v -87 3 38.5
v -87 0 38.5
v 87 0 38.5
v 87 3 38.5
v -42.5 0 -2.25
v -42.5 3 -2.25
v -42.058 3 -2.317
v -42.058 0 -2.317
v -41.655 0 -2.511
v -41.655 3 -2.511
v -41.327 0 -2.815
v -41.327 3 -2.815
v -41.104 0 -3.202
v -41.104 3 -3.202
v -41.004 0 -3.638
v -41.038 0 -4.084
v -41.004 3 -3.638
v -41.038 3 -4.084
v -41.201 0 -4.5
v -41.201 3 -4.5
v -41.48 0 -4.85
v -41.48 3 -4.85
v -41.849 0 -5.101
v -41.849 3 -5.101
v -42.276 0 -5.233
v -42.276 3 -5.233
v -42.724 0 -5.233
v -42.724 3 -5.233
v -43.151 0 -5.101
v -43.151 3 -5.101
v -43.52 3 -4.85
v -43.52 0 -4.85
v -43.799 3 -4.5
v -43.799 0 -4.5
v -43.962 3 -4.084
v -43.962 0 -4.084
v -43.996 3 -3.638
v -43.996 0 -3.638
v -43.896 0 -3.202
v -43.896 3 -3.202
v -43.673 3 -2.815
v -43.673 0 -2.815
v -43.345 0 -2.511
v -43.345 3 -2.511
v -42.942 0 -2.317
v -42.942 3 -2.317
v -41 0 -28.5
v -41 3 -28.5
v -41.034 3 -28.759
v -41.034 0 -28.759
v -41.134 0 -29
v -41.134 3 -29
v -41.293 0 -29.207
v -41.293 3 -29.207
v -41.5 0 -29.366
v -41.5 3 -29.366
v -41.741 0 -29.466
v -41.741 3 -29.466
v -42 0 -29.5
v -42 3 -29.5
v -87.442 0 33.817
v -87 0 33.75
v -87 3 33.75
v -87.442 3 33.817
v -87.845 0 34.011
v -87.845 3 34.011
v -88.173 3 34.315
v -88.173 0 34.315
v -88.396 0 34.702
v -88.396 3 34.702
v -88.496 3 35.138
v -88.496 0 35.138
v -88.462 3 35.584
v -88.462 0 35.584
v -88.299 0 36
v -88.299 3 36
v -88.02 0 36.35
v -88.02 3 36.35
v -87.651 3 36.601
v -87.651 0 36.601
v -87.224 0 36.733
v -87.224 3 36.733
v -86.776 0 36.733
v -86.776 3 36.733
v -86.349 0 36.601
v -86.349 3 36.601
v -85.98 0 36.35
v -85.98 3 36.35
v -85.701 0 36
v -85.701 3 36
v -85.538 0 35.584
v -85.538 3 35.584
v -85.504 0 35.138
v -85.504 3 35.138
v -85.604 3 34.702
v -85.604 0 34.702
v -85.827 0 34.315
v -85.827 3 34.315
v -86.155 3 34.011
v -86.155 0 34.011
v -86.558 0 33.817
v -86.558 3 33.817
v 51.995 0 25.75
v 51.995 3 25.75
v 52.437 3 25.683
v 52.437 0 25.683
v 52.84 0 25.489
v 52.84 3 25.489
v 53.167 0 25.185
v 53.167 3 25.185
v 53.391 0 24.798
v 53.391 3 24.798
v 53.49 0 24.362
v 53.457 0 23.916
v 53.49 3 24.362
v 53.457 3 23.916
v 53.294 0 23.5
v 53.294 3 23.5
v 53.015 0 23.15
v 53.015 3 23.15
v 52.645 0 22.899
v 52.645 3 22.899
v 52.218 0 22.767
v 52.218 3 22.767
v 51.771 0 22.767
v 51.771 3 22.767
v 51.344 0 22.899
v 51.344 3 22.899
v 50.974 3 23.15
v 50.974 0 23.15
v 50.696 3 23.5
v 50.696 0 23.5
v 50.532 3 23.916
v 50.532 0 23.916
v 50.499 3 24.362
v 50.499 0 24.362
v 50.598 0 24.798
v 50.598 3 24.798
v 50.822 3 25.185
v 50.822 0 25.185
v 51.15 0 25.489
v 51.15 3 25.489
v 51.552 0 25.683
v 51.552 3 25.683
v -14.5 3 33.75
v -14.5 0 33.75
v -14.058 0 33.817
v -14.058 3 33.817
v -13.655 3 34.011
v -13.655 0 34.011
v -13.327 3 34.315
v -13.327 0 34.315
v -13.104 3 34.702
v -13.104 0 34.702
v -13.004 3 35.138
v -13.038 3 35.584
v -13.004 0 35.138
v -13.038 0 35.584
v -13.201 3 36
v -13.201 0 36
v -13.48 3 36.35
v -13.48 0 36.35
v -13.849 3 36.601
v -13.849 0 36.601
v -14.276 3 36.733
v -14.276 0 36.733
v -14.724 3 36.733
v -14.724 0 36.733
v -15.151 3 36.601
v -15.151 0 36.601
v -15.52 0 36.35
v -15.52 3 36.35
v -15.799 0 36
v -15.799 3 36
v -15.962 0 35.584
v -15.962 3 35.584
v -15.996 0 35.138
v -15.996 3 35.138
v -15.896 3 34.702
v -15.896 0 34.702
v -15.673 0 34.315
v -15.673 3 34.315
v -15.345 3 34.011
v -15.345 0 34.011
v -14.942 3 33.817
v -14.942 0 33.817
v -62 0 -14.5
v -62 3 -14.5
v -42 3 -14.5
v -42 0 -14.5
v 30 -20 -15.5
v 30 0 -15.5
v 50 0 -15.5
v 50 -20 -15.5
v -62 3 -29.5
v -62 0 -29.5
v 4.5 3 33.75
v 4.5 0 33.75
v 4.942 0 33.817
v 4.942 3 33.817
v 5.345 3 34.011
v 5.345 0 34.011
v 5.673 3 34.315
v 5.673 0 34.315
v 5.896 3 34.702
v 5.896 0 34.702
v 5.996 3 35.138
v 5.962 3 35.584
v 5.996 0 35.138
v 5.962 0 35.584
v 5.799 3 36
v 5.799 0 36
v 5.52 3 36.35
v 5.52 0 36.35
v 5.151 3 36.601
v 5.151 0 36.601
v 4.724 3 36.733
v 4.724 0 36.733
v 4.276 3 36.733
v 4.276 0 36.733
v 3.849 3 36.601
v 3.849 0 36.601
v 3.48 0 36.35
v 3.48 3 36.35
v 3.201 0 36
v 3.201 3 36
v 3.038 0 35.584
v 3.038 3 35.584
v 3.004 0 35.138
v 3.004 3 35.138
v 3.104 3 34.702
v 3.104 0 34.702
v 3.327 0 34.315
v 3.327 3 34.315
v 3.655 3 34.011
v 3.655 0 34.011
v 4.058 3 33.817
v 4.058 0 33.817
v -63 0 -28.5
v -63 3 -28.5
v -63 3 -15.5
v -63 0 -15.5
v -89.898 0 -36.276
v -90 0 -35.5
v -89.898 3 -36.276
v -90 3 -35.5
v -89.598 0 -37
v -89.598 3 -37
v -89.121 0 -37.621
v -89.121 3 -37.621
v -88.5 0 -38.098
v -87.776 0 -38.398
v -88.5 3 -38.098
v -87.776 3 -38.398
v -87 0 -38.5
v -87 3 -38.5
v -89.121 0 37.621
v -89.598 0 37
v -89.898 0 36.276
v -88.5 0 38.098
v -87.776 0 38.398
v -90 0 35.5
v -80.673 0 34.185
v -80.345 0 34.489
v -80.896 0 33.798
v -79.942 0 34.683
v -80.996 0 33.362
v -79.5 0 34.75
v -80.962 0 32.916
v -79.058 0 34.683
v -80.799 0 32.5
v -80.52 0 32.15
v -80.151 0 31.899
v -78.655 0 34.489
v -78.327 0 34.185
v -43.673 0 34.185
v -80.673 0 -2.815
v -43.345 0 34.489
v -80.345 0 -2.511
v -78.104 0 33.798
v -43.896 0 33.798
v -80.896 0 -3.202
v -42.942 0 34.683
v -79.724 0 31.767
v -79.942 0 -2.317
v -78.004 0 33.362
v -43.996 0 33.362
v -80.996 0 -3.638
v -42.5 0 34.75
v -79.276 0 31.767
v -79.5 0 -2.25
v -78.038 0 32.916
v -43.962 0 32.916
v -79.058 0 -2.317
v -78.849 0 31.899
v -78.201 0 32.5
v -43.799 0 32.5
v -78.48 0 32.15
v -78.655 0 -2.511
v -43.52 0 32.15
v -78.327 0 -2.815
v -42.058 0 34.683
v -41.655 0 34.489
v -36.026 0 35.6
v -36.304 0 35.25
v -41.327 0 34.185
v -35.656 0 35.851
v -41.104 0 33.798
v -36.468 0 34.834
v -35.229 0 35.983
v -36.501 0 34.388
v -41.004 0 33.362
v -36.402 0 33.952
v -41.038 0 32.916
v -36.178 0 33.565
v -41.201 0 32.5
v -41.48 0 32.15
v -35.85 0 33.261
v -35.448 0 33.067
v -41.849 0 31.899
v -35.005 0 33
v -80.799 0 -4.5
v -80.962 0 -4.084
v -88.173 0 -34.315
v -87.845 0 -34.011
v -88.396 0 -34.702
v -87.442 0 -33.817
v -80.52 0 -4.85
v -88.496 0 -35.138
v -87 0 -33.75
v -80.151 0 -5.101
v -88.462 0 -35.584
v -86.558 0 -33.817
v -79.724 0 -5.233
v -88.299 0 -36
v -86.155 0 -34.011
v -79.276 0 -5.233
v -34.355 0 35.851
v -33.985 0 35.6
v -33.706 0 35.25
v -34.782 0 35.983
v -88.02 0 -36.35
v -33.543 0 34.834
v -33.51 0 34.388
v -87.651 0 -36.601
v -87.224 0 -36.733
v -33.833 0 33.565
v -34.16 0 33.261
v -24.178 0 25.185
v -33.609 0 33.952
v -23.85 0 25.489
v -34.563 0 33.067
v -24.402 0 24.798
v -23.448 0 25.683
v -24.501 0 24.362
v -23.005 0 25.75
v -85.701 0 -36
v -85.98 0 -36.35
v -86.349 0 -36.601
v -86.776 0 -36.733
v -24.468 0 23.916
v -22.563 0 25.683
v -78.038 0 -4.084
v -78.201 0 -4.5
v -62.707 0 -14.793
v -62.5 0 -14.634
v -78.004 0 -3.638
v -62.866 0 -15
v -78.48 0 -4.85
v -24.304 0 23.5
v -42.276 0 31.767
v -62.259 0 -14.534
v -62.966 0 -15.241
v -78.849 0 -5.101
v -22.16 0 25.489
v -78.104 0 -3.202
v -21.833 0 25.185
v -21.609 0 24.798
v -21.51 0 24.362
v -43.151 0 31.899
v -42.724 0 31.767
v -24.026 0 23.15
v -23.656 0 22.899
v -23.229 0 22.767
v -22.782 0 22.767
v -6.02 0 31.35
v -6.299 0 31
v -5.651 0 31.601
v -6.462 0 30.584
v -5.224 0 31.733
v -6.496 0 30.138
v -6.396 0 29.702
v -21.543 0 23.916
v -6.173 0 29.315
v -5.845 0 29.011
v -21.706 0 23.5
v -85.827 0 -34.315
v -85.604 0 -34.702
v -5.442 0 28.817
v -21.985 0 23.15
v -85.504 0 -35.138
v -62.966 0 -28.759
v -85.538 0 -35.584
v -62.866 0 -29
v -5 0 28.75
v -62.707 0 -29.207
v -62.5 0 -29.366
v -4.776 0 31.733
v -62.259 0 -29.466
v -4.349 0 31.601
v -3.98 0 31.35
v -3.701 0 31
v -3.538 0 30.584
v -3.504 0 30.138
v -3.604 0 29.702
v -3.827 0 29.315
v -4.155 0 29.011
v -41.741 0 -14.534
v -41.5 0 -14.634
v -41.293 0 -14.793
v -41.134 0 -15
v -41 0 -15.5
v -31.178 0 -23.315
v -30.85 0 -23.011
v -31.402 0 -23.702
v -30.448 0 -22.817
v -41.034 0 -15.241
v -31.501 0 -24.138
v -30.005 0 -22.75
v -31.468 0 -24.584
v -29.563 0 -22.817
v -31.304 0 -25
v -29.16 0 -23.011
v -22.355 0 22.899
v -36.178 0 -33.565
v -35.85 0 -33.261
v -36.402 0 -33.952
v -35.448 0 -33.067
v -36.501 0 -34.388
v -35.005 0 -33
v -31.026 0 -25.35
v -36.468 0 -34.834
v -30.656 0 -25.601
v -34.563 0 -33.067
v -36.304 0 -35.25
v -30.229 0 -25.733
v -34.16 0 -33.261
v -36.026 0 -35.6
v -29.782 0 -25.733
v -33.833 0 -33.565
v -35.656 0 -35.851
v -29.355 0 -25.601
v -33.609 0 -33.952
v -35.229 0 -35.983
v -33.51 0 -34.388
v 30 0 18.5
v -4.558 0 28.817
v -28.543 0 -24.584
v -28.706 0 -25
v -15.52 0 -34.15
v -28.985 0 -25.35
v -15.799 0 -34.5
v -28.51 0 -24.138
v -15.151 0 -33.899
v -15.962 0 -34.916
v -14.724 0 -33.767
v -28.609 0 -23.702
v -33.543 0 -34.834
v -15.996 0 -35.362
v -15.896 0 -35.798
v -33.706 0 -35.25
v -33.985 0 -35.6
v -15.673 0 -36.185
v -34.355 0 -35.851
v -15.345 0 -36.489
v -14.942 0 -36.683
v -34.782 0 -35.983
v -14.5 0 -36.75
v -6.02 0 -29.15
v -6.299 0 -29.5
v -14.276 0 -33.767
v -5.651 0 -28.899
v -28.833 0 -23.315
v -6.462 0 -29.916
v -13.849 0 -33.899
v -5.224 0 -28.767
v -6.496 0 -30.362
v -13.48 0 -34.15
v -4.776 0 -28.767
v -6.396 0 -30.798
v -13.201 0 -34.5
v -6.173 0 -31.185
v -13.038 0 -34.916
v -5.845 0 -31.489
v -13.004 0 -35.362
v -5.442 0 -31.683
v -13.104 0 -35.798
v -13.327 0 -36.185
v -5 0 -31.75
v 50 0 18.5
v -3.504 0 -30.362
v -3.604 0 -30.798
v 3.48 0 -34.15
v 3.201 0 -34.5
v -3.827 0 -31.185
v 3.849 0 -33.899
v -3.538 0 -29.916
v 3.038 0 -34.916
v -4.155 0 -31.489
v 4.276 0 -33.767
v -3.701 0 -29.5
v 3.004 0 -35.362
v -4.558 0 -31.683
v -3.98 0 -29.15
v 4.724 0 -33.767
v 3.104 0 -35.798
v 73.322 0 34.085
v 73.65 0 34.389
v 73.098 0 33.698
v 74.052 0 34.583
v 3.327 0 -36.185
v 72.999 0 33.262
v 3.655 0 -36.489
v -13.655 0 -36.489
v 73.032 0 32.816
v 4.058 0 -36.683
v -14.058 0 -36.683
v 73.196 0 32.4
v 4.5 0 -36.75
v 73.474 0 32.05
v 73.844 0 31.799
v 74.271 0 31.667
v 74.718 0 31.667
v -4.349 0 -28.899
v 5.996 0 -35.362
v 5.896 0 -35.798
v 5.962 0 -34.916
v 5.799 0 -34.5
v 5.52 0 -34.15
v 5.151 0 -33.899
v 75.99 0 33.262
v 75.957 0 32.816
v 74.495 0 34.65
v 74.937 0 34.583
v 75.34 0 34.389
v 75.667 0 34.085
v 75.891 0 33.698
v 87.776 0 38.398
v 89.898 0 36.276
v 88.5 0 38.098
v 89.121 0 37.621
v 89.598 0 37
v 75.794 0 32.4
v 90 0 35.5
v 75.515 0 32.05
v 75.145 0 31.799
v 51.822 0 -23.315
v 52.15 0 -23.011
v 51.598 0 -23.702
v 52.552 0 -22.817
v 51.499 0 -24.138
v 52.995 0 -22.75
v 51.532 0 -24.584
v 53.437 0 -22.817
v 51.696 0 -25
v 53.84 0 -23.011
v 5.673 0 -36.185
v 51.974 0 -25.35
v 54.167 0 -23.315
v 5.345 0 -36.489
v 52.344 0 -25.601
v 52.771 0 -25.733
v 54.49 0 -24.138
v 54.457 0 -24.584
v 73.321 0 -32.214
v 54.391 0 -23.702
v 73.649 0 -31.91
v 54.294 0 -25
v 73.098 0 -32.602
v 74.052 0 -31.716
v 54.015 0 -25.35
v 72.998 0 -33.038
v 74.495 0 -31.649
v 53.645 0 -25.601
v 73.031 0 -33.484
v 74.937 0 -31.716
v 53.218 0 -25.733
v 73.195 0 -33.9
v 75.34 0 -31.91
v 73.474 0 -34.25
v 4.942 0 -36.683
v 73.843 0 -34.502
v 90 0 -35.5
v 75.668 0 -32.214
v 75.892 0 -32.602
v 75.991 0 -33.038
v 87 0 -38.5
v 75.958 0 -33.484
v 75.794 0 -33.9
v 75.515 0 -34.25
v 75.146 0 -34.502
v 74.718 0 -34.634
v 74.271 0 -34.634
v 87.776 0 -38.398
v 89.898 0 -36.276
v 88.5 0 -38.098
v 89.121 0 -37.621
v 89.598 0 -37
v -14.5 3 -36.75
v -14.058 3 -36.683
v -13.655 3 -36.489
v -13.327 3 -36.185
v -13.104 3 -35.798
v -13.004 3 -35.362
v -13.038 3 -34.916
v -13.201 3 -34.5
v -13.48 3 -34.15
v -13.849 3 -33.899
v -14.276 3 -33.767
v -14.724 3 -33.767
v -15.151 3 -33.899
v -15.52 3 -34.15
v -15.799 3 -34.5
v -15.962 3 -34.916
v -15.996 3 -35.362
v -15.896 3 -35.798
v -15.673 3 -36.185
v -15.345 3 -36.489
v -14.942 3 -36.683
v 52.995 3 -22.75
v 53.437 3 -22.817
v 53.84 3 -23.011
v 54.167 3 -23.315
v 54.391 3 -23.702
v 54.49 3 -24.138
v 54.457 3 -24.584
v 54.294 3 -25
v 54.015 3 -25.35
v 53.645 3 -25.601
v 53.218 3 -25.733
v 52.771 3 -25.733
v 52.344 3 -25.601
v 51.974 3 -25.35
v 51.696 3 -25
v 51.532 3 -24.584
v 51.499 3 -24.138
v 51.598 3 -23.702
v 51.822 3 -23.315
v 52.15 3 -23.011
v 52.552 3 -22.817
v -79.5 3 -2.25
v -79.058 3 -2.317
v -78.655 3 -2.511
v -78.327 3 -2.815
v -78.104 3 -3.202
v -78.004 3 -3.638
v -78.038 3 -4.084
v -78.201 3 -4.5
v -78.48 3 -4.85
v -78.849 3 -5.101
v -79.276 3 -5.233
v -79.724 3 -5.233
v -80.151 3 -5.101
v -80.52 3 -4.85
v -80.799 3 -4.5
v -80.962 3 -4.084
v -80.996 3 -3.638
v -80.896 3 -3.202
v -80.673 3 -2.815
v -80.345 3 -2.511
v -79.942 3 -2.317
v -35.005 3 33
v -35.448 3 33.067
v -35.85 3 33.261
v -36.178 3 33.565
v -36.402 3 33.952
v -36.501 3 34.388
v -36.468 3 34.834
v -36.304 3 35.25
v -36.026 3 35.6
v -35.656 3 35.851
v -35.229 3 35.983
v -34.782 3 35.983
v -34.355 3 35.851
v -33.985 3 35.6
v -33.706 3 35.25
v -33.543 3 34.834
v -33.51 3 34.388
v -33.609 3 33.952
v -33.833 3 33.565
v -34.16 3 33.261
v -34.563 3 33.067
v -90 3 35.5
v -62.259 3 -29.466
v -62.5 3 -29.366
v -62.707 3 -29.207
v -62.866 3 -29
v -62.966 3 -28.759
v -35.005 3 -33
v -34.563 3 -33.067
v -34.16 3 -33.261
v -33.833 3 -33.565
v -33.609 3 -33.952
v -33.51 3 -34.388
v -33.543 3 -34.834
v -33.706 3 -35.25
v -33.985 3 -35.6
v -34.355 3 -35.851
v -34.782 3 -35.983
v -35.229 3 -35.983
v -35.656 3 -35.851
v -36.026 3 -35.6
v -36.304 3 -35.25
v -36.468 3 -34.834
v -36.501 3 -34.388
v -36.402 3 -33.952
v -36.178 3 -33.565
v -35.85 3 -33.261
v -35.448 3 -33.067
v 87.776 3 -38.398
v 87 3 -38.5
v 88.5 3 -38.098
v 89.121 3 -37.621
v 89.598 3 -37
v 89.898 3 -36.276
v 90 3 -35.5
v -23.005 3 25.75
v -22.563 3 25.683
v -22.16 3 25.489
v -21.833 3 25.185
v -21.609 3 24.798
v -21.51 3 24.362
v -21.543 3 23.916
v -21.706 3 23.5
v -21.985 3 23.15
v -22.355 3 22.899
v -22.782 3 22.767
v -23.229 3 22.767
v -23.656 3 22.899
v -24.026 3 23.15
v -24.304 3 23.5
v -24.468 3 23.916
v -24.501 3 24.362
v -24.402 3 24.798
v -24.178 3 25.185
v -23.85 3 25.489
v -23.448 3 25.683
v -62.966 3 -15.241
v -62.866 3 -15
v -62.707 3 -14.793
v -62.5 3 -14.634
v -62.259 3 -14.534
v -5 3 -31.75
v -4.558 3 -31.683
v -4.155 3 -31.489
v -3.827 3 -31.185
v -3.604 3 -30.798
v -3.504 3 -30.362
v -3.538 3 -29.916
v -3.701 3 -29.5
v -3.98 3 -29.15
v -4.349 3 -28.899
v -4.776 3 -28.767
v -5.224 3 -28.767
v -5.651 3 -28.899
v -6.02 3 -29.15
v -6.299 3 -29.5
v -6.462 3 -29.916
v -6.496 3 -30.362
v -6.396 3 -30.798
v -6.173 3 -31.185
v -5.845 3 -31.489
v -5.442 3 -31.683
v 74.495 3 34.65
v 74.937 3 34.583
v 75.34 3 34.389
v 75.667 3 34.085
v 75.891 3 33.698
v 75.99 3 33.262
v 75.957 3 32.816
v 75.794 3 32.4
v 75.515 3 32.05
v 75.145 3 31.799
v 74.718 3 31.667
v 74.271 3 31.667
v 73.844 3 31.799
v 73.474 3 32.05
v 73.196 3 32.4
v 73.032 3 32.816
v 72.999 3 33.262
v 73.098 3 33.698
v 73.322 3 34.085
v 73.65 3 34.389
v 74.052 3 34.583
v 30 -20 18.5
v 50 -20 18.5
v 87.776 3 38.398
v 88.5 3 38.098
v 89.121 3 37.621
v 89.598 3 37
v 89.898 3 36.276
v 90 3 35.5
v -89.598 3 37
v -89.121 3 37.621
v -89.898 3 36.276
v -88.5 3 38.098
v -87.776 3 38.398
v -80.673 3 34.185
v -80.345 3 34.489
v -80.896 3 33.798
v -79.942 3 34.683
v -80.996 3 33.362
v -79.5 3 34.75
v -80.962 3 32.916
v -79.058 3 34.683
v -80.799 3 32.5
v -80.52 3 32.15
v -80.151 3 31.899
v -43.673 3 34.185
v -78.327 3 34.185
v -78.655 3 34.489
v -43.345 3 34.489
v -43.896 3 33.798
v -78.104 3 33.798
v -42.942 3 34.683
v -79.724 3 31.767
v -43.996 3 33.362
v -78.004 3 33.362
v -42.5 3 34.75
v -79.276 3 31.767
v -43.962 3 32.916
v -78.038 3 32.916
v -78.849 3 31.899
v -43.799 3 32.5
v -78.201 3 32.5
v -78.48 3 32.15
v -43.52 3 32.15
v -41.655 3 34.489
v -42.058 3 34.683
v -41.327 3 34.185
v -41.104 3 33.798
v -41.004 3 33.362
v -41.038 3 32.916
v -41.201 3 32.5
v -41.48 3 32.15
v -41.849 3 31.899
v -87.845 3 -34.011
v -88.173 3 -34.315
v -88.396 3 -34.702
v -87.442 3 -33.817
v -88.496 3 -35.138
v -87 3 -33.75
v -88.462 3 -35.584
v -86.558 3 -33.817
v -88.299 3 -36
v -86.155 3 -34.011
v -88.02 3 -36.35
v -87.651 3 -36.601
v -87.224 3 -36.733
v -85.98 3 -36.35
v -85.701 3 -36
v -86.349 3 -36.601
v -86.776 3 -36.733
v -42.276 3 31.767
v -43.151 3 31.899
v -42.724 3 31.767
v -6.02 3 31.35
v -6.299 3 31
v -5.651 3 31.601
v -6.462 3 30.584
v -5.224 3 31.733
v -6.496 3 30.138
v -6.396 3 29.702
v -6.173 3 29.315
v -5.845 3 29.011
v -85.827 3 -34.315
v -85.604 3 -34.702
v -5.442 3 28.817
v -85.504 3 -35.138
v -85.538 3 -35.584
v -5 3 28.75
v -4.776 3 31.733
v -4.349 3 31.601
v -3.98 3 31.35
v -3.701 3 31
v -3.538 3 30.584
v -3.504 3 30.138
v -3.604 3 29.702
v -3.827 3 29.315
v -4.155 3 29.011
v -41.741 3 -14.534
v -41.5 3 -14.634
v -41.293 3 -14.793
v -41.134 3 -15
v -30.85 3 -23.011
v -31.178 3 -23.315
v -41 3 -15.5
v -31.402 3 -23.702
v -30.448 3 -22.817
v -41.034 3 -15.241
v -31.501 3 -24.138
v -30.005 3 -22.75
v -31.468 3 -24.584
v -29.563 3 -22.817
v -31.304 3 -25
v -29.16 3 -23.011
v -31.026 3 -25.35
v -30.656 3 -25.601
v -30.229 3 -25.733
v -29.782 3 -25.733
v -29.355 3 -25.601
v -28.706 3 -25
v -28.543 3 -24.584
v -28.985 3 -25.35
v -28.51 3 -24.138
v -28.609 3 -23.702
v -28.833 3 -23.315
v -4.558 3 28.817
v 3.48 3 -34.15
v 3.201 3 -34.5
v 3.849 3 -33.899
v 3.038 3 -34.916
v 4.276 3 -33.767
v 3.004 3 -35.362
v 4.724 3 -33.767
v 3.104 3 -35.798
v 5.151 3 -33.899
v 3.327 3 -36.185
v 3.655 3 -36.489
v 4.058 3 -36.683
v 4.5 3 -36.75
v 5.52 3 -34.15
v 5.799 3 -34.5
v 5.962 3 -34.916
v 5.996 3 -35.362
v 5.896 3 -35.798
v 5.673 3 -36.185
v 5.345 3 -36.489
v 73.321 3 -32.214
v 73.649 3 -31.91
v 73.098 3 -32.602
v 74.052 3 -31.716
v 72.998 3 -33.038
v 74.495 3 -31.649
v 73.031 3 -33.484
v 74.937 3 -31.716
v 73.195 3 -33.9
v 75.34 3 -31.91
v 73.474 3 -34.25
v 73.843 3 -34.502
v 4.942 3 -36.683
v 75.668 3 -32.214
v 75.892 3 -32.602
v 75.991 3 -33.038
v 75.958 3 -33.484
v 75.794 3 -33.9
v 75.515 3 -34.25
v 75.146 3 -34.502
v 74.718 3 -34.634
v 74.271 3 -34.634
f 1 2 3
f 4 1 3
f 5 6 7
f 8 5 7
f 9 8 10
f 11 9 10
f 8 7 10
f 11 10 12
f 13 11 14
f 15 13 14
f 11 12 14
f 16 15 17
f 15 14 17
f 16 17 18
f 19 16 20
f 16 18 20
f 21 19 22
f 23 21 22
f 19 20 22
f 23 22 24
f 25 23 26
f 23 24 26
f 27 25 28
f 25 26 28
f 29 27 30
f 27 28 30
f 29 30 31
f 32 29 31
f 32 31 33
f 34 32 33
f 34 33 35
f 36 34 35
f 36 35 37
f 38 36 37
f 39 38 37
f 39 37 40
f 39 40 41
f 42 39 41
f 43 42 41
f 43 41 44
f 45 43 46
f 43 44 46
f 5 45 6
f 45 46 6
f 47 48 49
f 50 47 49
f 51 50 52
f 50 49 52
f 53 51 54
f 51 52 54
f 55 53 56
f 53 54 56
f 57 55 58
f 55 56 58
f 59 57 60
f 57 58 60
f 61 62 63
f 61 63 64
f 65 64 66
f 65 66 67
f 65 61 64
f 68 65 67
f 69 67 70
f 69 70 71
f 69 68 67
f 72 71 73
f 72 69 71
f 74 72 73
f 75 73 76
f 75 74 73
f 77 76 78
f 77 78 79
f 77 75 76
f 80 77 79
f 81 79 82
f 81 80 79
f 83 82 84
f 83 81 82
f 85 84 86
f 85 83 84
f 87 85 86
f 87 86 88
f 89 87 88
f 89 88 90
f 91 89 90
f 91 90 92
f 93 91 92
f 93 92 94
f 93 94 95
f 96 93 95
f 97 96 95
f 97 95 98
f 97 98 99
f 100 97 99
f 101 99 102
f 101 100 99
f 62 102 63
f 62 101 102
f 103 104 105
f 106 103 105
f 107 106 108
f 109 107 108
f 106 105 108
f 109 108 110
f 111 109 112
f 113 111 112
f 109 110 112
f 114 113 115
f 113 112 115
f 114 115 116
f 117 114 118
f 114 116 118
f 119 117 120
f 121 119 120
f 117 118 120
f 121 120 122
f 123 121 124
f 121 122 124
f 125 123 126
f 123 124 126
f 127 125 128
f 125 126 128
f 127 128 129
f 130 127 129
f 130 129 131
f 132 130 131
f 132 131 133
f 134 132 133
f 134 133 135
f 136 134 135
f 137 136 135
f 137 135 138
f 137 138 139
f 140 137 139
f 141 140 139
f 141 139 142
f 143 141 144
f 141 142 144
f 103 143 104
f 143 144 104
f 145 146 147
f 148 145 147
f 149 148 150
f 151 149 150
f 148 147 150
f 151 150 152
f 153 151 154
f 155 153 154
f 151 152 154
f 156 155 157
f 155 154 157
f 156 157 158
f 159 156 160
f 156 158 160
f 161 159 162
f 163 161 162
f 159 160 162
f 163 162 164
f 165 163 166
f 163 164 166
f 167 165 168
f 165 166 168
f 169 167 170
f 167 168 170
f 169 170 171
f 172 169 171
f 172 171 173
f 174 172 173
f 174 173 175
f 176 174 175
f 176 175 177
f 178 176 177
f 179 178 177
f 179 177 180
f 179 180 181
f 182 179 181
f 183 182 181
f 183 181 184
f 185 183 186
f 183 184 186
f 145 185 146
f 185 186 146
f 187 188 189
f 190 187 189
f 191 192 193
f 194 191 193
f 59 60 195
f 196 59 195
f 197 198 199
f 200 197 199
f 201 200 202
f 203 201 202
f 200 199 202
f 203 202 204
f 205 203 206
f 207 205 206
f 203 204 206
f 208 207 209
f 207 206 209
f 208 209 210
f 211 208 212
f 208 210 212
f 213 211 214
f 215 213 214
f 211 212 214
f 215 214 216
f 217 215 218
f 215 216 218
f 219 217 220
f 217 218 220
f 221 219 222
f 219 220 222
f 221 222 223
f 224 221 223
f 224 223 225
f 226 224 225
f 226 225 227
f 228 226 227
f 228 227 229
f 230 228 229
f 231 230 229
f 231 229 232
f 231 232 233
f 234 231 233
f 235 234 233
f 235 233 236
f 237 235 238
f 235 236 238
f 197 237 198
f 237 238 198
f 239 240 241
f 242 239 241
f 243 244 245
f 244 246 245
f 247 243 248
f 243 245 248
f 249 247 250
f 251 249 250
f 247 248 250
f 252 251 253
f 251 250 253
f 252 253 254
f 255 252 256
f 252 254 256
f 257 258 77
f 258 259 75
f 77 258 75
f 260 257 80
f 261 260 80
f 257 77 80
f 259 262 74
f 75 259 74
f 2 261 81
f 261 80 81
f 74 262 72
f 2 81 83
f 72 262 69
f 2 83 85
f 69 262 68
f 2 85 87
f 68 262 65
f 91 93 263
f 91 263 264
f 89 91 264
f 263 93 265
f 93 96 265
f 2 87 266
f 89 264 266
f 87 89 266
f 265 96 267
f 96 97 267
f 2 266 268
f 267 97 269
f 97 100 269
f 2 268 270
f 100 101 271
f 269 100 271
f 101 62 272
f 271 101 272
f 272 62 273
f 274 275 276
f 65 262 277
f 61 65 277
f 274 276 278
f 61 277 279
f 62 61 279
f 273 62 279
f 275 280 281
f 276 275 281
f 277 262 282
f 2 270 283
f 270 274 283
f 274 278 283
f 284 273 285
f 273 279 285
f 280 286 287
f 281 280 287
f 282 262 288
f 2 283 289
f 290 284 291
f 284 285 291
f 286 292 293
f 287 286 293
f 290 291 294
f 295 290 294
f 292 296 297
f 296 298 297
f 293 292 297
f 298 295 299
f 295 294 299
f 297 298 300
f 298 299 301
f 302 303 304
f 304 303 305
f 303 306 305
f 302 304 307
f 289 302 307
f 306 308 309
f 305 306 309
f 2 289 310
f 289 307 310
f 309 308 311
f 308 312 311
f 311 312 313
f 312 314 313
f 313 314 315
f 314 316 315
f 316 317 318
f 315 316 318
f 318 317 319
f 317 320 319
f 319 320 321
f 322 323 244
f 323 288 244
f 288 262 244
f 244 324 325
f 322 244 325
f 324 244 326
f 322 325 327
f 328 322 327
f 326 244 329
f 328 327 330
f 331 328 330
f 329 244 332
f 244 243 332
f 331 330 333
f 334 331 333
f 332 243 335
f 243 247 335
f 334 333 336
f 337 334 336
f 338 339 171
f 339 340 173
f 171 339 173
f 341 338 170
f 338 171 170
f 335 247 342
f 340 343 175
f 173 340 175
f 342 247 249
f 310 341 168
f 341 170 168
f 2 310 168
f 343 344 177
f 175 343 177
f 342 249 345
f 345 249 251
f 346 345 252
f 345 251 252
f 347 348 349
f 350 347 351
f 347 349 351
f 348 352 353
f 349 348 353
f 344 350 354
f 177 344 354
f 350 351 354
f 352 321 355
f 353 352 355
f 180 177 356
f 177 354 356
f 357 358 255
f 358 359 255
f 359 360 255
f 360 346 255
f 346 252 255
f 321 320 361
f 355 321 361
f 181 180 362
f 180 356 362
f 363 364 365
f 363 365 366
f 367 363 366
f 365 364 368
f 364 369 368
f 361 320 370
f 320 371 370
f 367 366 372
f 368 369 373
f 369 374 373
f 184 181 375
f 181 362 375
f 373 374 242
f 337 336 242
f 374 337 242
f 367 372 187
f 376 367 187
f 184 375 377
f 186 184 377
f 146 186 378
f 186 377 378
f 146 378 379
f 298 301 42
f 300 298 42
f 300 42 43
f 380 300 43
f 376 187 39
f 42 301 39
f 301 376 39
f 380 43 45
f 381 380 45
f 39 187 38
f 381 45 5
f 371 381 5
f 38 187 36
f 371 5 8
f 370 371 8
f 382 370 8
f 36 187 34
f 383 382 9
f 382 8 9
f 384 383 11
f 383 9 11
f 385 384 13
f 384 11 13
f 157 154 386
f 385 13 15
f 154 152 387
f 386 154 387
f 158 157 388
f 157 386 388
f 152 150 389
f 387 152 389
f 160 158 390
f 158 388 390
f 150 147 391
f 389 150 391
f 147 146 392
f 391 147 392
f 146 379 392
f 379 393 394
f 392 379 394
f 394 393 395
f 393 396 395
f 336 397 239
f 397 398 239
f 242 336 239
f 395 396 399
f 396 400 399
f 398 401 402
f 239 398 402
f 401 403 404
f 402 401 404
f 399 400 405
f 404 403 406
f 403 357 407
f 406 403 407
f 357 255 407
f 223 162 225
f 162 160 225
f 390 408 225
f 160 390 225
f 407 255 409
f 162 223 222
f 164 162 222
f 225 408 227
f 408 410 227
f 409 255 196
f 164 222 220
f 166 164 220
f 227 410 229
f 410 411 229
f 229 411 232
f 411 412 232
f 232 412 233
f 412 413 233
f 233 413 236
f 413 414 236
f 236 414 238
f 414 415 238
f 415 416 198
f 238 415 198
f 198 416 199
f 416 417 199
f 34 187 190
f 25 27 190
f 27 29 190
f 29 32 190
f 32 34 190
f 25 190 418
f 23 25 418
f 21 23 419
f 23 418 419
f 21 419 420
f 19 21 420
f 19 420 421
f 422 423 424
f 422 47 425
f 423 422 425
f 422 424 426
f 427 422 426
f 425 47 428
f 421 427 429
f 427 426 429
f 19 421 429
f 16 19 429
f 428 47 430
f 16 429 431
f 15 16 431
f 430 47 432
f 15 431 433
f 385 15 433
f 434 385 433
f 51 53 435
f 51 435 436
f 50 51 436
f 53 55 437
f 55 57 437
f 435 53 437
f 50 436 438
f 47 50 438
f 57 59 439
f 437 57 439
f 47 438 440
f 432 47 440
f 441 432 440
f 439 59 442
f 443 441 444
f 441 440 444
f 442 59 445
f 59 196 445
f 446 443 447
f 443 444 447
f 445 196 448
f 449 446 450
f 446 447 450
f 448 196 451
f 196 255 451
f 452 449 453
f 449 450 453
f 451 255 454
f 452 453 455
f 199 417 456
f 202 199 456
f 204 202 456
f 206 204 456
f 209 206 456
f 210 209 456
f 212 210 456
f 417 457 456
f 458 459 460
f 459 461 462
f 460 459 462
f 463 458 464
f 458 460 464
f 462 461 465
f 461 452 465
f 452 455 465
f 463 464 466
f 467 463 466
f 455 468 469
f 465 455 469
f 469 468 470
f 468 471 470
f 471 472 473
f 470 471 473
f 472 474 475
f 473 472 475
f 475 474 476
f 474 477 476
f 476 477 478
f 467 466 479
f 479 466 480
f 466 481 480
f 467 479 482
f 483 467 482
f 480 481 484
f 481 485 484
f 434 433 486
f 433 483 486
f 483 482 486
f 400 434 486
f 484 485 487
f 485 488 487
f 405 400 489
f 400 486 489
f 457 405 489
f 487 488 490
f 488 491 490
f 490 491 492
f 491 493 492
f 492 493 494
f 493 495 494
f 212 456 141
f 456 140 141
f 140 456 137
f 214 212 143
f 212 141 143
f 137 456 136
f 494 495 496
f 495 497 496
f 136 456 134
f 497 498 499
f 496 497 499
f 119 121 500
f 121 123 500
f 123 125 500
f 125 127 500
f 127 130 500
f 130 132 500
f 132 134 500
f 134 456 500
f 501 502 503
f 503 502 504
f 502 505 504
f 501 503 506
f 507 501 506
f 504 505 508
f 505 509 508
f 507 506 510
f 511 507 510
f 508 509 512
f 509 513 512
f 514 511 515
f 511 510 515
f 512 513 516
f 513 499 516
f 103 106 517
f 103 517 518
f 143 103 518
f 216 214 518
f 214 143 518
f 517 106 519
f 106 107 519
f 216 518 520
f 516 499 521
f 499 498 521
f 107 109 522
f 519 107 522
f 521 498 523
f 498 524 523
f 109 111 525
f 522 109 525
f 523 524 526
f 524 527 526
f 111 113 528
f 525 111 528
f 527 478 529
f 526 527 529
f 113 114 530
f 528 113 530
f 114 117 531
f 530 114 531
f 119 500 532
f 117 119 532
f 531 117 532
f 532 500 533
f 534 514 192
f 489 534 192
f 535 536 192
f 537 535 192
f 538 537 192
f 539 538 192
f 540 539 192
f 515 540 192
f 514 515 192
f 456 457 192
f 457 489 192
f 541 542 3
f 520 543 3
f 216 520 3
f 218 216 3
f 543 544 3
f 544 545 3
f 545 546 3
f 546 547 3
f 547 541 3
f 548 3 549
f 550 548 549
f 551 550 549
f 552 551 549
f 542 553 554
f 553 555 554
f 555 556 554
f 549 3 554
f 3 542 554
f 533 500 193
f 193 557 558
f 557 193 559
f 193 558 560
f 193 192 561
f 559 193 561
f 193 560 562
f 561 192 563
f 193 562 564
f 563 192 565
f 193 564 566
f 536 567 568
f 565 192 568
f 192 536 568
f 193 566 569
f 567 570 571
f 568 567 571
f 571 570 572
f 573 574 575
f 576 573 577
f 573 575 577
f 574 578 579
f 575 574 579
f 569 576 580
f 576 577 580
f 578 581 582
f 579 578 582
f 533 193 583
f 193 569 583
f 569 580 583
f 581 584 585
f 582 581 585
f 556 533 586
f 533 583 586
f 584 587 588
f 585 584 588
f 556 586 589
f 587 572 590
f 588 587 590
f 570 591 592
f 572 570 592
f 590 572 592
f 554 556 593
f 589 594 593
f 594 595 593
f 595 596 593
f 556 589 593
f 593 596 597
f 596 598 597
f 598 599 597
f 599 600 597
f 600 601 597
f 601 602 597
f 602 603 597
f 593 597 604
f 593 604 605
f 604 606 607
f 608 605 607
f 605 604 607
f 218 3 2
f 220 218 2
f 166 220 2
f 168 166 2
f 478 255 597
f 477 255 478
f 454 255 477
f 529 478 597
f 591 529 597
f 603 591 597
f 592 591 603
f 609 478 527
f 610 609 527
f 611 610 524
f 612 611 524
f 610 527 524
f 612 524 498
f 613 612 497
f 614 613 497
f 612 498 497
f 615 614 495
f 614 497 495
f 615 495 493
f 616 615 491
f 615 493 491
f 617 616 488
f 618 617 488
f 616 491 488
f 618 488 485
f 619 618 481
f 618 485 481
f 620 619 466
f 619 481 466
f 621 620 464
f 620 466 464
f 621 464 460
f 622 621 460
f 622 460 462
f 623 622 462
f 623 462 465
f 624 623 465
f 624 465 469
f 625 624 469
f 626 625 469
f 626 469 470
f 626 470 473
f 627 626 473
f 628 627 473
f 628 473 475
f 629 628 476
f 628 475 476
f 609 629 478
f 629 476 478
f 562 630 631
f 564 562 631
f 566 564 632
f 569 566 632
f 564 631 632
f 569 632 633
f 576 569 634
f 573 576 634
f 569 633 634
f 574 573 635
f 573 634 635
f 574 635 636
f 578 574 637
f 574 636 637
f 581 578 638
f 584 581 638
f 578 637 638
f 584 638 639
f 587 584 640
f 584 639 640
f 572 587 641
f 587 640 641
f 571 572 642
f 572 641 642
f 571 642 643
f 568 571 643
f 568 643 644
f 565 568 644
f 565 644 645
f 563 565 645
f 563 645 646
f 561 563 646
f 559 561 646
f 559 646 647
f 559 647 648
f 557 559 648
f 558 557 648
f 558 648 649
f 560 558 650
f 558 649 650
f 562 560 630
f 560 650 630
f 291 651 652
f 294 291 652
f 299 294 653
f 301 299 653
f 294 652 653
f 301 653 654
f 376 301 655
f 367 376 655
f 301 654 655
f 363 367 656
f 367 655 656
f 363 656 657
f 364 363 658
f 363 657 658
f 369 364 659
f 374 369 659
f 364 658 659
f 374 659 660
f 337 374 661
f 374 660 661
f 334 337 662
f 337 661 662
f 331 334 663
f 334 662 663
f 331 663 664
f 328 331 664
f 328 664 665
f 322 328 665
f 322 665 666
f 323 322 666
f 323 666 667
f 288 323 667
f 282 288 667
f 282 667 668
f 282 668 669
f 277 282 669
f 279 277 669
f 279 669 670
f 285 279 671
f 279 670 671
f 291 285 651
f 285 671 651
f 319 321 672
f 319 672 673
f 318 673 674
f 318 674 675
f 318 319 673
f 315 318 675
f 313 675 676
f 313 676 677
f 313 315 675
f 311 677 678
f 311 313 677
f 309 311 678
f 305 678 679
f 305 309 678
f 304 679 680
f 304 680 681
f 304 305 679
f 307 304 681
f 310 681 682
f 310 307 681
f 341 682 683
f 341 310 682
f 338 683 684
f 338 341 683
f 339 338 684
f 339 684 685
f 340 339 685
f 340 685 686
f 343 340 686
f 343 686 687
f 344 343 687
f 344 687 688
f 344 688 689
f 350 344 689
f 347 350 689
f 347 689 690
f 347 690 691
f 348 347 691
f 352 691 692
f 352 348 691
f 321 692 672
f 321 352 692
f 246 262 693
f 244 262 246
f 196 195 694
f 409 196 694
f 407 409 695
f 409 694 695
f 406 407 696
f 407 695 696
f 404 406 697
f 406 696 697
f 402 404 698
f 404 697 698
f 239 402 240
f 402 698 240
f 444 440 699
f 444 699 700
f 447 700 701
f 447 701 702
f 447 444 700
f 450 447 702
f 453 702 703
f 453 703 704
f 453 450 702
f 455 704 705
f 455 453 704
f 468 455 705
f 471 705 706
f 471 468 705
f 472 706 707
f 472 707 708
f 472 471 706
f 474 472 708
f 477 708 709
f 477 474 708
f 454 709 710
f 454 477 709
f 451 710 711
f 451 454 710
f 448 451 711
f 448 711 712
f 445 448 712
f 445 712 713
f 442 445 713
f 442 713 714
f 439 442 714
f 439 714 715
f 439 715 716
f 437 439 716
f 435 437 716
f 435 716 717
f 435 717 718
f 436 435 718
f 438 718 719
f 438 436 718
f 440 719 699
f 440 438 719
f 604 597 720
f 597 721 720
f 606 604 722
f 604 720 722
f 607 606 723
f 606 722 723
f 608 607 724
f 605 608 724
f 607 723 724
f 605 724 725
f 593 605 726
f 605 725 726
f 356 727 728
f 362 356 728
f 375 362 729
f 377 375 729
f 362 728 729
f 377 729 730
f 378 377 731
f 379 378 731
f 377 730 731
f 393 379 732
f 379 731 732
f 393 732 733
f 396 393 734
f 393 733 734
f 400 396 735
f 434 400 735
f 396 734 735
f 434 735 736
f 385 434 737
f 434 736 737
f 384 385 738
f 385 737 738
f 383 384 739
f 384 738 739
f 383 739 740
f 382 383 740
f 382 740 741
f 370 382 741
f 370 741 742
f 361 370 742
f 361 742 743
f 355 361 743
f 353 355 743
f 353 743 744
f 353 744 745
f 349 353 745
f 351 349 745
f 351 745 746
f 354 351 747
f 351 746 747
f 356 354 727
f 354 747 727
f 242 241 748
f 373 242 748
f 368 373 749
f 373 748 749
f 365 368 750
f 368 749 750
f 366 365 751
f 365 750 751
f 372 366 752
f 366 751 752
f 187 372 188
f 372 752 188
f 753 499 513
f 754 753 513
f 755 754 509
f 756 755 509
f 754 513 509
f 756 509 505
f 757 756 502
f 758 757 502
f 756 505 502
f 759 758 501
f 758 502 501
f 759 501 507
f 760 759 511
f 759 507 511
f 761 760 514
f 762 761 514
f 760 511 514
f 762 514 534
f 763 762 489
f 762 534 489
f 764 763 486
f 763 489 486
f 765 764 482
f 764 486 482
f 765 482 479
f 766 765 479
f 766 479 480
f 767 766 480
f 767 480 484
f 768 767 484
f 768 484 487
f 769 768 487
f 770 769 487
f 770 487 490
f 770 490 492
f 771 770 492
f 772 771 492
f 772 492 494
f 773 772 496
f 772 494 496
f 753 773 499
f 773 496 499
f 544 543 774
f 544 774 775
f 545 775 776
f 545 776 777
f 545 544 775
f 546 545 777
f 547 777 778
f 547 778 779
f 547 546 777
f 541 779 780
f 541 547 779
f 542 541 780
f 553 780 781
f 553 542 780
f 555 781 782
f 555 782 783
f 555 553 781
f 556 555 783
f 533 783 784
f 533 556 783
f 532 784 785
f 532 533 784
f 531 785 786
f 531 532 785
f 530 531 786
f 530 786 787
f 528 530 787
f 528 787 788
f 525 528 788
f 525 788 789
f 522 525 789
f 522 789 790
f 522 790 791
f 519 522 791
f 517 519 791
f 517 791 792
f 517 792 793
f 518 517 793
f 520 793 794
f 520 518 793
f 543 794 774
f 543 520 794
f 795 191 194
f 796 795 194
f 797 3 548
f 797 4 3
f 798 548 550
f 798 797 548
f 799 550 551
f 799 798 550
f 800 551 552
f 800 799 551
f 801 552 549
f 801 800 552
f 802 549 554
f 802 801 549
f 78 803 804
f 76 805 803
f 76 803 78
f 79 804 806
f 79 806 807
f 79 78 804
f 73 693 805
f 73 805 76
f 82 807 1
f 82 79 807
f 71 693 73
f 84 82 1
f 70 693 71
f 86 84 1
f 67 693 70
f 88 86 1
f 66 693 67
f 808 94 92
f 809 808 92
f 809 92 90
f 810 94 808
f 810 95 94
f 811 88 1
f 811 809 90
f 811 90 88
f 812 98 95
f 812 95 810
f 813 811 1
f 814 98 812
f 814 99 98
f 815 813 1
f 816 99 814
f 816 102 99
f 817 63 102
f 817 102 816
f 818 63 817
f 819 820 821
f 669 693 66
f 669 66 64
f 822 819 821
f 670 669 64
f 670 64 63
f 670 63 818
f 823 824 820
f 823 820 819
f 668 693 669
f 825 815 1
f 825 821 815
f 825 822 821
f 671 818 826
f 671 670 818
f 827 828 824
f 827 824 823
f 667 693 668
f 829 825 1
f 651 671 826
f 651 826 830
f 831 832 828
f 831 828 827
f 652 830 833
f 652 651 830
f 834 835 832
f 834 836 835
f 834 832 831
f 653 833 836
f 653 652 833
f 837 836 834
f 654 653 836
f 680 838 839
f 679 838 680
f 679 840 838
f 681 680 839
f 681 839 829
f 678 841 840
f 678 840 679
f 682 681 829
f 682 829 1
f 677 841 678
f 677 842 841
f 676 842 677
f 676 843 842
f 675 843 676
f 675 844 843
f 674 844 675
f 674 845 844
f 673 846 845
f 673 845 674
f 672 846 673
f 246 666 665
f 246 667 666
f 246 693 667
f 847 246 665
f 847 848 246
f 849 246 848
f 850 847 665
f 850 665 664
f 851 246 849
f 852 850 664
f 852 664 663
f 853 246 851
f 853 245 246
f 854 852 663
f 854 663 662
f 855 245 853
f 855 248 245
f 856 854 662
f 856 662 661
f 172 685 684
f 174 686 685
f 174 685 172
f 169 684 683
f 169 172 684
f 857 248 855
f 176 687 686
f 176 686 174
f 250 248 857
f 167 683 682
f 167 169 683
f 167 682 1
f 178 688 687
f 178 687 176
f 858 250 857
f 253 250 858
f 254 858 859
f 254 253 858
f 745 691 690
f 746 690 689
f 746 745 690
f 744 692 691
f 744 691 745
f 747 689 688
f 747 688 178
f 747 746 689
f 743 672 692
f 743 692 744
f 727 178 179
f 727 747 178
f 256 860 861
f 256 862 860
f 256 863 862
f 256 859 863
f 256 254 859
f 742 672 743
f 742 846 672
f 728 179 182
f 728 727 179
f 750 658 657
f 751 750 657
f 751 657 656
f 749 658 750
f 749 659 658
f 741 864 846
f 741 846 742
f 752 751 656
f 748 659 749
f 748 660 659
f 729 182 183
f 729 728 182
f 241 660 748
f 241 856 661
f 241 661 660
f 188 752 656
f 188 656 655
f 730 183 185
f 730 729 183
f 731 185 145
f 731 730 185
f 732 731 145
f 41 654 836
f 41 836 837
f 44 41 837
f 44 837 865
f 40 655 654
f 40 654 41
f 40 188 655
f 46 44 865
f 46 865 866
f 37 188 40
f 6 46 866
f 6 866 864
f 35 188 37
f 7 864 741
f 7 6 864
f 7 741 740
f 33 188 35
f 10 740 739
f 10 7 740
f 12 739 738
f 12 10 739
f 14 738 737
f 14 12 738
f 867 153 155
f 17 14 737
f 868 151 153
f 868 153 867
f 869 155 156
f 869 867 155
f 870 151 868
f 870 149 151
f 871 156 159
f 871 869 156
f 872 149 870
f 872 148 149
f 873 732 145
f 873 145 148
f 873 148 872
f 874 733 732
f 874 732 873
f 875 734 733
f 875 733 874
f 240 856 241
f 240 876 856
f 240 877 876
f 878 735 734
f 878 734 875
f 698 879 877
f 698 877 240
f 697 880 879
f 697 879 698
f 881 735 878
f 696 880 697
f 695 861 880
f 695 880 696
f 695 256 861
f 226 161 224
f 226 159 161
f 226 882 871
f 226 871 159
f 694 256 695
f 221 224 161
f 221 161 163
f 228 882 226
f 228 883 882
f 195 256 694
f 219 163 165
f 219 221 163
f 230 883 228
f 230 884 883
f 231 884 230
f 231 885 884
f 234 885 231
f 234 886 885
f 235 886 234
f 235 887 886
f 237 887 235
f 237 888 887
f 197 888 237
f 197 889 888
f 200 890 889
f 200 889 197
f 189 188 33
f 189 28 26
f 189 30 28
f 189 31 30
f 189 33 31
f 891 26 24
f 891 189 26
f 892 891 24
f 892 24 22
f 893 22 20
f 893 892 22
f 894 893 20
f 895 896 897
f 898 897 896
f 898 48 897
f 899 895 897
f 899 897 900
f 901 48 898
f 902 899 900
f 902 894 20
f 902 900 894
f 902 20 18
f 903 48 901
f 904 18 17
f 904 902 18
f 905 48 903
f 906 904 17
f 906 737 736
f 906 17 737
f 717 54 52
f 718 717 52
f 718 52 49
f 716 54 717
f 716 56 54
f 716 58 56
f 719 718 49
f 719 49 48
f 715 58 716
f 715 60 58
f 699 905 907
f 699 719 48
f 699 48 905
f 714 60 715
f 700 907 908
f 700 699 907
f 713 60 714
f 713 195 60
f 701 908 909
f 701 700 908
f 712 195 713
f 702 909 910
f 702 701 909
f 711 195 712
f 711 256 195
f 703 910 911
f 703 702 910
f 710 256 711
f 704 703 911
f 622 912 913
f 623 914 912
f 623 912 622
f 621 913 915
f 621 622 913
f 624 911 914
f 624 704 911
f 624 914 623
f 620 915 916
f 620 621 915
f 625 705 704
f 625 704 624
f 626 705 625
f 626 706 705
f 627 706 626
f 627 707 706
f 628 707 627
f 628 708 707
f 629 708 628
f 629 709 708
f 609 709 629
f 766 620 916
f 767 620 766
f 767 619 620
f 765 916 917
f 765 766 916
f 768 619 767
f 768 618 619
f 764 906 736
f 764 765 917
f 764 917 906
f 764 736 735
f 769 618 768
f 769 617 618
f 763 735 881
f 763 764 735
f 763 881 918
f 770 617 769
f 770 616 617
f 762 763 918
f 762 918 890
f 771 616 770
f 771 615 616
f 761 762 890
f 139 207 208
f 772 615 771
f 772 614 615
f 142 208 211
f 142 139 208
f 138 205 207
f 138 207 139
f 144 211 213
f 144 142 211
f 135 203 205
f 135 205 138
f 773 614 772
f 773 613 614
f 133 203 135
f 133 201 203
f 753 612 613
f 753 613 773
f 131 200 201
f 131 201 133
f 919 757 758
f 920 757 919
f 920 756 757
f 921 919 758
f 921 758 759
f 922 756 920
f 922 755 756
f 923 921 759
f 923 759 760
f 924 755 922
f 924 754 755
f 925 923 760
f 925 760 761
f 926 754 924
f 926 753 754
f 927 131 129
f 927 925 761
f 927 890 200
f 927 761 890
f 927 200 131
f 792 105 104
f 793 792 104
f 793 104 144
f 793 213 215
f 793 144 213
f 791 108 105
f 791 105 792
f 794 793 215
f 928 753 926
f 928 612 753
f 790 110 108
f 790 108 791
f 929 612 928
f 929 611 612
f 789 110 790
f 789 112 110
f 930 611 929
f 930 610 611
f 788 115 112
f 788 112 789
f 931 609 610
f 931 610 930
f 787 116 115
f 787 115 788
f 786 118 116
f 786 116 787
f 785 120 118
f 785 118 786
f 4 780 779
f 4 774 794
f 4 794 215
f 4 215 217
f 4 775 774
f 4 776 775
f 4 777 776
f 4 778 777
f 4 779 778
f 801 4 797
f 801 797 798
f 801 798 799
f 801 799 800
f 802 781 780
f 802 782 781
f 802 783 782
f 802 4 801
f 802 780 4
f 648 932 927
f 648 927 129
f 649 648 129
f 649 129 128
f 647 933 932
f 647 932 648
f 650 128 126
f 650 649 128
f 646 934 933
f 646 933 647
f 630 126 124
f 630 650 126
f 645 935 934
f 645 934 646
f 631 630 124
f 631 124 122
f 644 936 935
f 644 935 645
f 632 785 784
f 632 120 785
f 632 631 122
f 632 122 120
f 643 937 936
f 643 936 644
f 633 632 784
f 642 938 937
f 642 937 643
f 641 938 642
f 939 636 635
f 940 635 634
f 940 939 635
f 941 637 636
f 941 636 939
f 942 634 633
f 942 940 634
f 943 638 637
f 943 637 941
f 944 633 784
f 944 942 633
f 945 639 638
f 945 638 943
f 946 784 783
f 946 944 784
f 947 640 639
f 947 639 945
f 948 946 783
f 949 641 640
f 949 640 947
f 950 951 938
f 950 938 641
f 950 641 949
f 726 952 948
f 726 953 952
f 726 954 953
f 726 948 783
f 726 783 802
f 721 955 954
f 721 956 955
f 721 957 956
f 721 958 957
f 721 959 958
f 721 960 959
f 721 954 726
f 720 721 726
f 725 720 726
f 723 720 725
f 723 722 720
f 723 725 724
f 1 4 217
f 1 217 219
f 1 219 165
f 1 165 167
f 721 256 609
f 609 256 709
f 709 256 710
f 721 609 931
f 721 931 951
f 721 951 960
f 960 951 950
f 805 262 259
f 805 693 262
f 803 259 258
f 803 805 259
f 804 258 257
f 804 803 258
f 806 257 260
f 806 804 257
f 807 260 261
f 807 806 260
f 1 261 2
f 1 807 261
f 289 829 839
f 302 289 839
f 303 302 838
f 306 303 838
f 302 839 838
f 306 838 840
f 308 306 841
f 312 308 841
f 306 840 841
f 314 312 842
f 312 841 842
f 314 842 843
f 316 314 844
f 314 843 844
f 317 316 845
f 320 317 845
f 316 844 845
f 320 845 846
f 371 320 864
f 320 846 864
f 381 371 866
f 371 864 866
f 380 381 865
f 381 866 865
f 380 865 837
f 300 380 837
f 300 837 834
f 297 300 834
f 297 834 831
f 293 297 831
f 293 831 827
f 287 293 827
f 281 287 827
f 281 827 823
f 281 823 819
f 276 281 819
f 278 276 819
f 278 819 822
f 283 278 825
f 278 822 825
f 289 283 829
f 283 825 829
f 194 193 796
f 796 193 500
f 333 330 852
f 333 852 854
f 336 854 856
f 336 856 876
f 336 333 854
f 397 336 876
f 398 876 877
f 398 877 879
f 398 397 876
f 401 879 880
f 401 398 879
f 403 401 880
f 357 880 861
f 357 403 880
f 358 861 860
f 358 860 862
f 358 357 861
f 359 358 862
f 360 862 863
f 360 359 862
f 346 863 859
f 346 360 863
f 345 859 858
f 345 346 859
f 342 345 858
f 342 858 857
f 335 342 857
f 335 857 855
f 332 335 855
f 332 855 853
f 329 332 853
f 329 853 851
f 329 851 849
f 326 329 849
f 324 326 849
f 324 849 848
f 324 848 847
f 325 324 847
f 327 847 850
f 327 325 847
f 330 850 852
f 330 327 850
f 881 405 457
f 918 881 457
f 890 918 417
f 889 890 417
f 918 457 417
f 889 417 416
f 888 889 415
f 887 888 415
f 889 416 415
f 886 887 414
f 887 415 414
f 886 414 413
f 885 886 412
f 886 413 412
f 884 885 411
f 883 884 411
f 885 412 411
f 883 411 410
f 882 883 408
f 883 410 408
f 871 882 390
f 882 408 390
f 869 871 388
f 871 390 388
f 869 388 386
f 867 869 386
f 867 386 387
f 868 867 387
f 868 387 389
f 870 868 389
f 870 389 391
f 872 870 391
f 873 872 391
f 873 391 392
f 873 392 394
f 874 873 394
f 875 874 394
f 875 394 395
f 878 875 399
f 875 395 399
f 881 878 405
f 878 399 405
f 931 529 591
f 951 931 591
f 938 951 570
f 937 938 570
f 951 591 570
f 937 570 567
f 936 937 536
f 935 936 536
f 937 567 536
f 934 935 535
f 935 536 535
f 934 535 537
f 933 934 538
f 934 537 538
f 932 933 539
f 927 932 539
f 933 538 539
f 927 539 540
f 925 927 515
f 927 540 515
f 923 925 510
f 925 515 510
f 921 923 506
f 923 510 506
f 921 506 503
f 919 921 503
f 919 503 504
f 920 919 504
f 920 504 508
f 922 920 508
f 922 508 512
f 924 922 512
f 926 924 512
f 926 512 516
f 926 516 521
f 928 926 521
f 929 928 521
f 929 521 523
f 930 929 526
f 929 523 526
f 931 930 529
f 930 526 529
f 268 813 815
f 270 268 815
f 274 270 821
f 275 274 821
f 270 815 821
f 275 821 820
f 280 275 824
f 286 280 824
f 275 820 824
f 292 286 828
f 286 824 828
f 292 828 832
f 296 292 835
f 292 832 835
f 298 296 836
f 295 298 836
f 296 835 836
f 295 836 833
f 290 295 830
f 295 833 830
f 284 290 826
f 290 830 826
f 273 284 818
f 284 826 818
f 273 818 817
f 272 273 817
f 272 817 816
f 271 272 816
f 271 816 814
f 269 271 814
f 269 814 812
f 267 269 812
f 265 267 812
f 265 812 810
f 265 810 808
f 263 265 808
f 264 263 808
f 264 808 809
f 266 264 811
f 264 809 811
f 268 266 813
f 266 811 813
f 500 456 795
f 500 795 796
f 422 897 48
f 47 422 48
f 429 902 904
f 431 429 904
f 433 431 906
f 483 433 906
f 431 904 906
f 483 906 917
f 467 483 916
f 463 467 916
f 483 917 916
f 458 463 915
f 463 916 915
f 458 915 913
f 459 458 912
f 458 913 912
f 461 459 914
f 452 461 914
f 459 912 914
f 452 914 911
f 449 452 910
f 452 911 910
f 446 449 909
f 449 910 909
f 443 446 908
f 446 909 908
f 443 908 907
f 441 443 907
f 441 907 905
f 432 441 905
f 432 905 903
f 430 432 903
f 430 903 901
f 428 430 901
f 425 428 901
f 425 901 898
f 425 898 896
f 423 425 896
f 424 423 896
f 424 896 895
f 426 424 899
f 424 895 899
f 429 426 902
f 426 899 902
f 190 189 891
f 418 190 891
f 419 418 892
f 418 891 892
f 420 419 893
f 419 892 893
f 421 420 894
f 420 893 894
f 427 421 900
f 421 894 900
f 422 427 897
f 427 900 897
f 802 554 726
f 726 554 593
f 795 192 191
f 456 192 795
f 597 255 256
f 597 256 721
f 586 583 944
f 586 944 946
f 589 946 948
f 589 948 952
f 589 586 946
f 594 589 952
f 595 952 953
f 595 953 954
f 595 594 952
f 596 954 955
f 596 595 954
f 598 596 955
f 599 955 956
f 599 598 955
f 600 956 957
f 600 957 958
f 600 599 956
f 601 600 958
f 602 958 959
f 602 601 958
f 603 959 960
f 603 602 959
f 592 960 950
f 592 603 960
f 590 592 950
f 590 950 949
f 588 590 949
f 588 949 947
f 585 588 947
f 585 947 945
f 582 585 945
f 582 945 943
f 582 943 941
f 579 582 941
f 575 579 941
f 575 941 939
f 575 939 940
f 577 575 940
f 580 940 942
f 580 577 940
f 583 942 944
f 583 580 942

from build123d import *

# Parameters (mm, degrees)
SKETCH1_W           = 180
SKETCH1_H           = 77
SKETCH1_R           = 1.5
SKETCH1_R_2         = 1.500742376
BOSS_EXTRUDE1_DEPTH = 3
FILLET1_R           = 3
CUT_EXTRUDE1_DEPTH  = 3
SKETCH3_R           = 1.5
CUT_EXTRUDE2_DEPTH  = 3
SKETCH4_R           = 1.5
CUT_EXTRUDE3_DEPTH  = 3
SKETCH5_W           = 20
SKETCH5_H           = 34
BOSS_EXTRUDE2_DEPTH = 20
SKETCH6_R           = 1.5
CUT_EXTRUDE4_DEPTH  = 3


with BuildPart() as part:
    # Sketch1 → Boss-Extrude1 (new body)
    with BuildSketch(Plane(origin=(0, 0, 0), x_dir=(1, 0, 0), z_dir=(0, 1, 0))):
        Rectangle(SKETCH1_W, SKETCH1_H)
        with Locations(Location((-87, 35.25, 0), (0, 0, 270))):
            Circle(SKETCH1_R, mode=Mode.SUBTRACT)
        with Locations(Location((-87, -35.25, 0), (0, 0, 90))):
            Circle(SKETCH1_R, mode=Mode.SUBTRACT)
        with Locations(Location((-35.005408935, 34.5, 0), (0, 0, 270))):
            Circle(SKETCH1_R, mode=Mode.SUBTRACT)
        with Locations(Location((-35.005408935, -34.5, 0), (0, 0, 90))):
            Circle(SKETCH1_R, mode=Mode.SUBTRACT)
        with Locations(Location((74.494591065, 33.15, 0), (0, 0, 270))):
            Circle(SKETCH1_R_2, mode=Mode.SUBTRACT)
        with Locations(Location((74.494591065, -33.15, 0), (0, 0, 270))):
            Circle(SKETCH1_R, mode=Mode.SUBTRACT)
    extrude(amount=BOSS_EXTRUDE1_DEPTH)

    # Fillet1
    fillet1_edges = [part.edges().sort_by_distance(p)[0] for p in [
        (90, 1.5, 38.5),
        (-90, 1.5, 38.5),
        (-90, 1.5, -38.5),
        (90, 1.5, -38.5),
    ]]
    fillet(fillet1_edges, radius=FILLET1_R)

    # Sketch2 → Cut-Extrude1 (cut)
    with BuildSketch(Plane(origin=(0, 3, 0), x_dir=(1, 0, 0), z_dir=(0, 1, 0))):
        with BuildLine():
            Line((-62, 14.5), (-42, 14.5))
            ThreePointArc((-42, 14.5), (-41.292893219, 14.792893219), (-41, 15.5))
            Line((-41, 15.5), (-41, 28.5))
            ThreePointArc((-41, 28.5), (-41.292893219, 29.207106781), (-42, 29.5))
            Line((-42, 29.5), (-62, 29.5))
            ThreePointArc((-62, 29.5), (-62.707106781, 29.207106781), (-63, 28.5))
            Line((-63, 28.5), (-63, 15.5))
            ThreePointArc((-63, 15.5), (-62.707106781, 14.792893219), (-62, 14.5))
        make_face()
    extrude(amount=-CUT_EXTRUDE1_DEPTH, mode=Mode.SUBTRACT)

    # Sketch3 → Cut-Extrude2 (cut)
    with BuildSketch(Plane(origin=(0, 3, 0), x_dir=(1, 0, 0), z_dir=(0, 1, 0))):
        with Locations(Location((-79.5, 3.75, 0), (0, 0, 270))):
            Circle(SKETCH3_R)
        with Locations(Location((-42.5, 3.75, 0), (0, 0, 270))):
            Circle(SKETCH3_R)
        with Locations(Location((-42.5, -33.25, 0), (0, 0, 270))):
            Circle(SKETCH3_R)
        with Locations(Location((-79.5, -33.25, 0), (0, 0, 270))):
            Circle(SKETCH3_R)
    extrude(amount=-CUT_EXTRUDE2_DEPTH, mode=Mode.SUBTRACT)

    # Sketch4 → Cut-Extrude3 (cut)
    with BuildSketch(Plane(origin=(0, 3, 0), x_dir=(1, 0, 0), z_dir=(0, 1, 0))):
        with Locations(Location((-30.005408935, 24.25, 0), (0, 0, 270))):
            Circle(SKETCH4_R)
        with Locations(Location((52.994591065, 24.25, 0), (0, 0, 270))):
            Circle(SKETCH4_R)
        with Locations(Location((51.994591065, -24.25, 0), (0, 0, 270))):
            Circle(SKETCH4_R)
        with Locations(Location((-23.005408935, -24.25, 0), (0, 0, 270))):
            Circle(SKETCH4_R)
    extrude(amount=-CUT_EXTRUDE3_DEPTH, mode=Mode.SUBTRACT)

    # Sketch5 → Boss-Extrude2 (add)
    with BuildSketch(Plane.XZ):
        with Locations((40, 1.5)):
            Rectangle(SKETCH5_W, SKETCH5_H)
    extrude(amount=BOSS_EXTRUDE2_DEPTH)

    # Sketch6 → Cut-Extrude4 (cut)
    with BuildSketch(Plane.XZ):
        with Locations(Location((-14.5, -35.25, 0), (0, 0, 270))):
            Circle(SKETCH6_R)
        with Locations(Location((4.5, -35.25, 0), (0, 0, 270))):
            Circle(SKETCH6_R)
        with Locations(Location((4.5, 35.25, 0), (0, 0, 270))):
            Circle(SKETCH6_R)
        with Locations(Location((-14.5, 35.25, 0), (0, 0, 270))):
            Circle(SKETCH6_R)
        with Locations(Location((-5, -30.25, 0), (0, 0, 270))):
            Circle(SKETCH6_R)
        with Locations(Location((-5, 30.25, 0), (0, 0, 270))):
            Circle(SKETCH6_R)
    extrude(amount=-CUT_EXTRUDE4_DEPTH, mode=Mode.SUBTRACT)


solid = part.part
